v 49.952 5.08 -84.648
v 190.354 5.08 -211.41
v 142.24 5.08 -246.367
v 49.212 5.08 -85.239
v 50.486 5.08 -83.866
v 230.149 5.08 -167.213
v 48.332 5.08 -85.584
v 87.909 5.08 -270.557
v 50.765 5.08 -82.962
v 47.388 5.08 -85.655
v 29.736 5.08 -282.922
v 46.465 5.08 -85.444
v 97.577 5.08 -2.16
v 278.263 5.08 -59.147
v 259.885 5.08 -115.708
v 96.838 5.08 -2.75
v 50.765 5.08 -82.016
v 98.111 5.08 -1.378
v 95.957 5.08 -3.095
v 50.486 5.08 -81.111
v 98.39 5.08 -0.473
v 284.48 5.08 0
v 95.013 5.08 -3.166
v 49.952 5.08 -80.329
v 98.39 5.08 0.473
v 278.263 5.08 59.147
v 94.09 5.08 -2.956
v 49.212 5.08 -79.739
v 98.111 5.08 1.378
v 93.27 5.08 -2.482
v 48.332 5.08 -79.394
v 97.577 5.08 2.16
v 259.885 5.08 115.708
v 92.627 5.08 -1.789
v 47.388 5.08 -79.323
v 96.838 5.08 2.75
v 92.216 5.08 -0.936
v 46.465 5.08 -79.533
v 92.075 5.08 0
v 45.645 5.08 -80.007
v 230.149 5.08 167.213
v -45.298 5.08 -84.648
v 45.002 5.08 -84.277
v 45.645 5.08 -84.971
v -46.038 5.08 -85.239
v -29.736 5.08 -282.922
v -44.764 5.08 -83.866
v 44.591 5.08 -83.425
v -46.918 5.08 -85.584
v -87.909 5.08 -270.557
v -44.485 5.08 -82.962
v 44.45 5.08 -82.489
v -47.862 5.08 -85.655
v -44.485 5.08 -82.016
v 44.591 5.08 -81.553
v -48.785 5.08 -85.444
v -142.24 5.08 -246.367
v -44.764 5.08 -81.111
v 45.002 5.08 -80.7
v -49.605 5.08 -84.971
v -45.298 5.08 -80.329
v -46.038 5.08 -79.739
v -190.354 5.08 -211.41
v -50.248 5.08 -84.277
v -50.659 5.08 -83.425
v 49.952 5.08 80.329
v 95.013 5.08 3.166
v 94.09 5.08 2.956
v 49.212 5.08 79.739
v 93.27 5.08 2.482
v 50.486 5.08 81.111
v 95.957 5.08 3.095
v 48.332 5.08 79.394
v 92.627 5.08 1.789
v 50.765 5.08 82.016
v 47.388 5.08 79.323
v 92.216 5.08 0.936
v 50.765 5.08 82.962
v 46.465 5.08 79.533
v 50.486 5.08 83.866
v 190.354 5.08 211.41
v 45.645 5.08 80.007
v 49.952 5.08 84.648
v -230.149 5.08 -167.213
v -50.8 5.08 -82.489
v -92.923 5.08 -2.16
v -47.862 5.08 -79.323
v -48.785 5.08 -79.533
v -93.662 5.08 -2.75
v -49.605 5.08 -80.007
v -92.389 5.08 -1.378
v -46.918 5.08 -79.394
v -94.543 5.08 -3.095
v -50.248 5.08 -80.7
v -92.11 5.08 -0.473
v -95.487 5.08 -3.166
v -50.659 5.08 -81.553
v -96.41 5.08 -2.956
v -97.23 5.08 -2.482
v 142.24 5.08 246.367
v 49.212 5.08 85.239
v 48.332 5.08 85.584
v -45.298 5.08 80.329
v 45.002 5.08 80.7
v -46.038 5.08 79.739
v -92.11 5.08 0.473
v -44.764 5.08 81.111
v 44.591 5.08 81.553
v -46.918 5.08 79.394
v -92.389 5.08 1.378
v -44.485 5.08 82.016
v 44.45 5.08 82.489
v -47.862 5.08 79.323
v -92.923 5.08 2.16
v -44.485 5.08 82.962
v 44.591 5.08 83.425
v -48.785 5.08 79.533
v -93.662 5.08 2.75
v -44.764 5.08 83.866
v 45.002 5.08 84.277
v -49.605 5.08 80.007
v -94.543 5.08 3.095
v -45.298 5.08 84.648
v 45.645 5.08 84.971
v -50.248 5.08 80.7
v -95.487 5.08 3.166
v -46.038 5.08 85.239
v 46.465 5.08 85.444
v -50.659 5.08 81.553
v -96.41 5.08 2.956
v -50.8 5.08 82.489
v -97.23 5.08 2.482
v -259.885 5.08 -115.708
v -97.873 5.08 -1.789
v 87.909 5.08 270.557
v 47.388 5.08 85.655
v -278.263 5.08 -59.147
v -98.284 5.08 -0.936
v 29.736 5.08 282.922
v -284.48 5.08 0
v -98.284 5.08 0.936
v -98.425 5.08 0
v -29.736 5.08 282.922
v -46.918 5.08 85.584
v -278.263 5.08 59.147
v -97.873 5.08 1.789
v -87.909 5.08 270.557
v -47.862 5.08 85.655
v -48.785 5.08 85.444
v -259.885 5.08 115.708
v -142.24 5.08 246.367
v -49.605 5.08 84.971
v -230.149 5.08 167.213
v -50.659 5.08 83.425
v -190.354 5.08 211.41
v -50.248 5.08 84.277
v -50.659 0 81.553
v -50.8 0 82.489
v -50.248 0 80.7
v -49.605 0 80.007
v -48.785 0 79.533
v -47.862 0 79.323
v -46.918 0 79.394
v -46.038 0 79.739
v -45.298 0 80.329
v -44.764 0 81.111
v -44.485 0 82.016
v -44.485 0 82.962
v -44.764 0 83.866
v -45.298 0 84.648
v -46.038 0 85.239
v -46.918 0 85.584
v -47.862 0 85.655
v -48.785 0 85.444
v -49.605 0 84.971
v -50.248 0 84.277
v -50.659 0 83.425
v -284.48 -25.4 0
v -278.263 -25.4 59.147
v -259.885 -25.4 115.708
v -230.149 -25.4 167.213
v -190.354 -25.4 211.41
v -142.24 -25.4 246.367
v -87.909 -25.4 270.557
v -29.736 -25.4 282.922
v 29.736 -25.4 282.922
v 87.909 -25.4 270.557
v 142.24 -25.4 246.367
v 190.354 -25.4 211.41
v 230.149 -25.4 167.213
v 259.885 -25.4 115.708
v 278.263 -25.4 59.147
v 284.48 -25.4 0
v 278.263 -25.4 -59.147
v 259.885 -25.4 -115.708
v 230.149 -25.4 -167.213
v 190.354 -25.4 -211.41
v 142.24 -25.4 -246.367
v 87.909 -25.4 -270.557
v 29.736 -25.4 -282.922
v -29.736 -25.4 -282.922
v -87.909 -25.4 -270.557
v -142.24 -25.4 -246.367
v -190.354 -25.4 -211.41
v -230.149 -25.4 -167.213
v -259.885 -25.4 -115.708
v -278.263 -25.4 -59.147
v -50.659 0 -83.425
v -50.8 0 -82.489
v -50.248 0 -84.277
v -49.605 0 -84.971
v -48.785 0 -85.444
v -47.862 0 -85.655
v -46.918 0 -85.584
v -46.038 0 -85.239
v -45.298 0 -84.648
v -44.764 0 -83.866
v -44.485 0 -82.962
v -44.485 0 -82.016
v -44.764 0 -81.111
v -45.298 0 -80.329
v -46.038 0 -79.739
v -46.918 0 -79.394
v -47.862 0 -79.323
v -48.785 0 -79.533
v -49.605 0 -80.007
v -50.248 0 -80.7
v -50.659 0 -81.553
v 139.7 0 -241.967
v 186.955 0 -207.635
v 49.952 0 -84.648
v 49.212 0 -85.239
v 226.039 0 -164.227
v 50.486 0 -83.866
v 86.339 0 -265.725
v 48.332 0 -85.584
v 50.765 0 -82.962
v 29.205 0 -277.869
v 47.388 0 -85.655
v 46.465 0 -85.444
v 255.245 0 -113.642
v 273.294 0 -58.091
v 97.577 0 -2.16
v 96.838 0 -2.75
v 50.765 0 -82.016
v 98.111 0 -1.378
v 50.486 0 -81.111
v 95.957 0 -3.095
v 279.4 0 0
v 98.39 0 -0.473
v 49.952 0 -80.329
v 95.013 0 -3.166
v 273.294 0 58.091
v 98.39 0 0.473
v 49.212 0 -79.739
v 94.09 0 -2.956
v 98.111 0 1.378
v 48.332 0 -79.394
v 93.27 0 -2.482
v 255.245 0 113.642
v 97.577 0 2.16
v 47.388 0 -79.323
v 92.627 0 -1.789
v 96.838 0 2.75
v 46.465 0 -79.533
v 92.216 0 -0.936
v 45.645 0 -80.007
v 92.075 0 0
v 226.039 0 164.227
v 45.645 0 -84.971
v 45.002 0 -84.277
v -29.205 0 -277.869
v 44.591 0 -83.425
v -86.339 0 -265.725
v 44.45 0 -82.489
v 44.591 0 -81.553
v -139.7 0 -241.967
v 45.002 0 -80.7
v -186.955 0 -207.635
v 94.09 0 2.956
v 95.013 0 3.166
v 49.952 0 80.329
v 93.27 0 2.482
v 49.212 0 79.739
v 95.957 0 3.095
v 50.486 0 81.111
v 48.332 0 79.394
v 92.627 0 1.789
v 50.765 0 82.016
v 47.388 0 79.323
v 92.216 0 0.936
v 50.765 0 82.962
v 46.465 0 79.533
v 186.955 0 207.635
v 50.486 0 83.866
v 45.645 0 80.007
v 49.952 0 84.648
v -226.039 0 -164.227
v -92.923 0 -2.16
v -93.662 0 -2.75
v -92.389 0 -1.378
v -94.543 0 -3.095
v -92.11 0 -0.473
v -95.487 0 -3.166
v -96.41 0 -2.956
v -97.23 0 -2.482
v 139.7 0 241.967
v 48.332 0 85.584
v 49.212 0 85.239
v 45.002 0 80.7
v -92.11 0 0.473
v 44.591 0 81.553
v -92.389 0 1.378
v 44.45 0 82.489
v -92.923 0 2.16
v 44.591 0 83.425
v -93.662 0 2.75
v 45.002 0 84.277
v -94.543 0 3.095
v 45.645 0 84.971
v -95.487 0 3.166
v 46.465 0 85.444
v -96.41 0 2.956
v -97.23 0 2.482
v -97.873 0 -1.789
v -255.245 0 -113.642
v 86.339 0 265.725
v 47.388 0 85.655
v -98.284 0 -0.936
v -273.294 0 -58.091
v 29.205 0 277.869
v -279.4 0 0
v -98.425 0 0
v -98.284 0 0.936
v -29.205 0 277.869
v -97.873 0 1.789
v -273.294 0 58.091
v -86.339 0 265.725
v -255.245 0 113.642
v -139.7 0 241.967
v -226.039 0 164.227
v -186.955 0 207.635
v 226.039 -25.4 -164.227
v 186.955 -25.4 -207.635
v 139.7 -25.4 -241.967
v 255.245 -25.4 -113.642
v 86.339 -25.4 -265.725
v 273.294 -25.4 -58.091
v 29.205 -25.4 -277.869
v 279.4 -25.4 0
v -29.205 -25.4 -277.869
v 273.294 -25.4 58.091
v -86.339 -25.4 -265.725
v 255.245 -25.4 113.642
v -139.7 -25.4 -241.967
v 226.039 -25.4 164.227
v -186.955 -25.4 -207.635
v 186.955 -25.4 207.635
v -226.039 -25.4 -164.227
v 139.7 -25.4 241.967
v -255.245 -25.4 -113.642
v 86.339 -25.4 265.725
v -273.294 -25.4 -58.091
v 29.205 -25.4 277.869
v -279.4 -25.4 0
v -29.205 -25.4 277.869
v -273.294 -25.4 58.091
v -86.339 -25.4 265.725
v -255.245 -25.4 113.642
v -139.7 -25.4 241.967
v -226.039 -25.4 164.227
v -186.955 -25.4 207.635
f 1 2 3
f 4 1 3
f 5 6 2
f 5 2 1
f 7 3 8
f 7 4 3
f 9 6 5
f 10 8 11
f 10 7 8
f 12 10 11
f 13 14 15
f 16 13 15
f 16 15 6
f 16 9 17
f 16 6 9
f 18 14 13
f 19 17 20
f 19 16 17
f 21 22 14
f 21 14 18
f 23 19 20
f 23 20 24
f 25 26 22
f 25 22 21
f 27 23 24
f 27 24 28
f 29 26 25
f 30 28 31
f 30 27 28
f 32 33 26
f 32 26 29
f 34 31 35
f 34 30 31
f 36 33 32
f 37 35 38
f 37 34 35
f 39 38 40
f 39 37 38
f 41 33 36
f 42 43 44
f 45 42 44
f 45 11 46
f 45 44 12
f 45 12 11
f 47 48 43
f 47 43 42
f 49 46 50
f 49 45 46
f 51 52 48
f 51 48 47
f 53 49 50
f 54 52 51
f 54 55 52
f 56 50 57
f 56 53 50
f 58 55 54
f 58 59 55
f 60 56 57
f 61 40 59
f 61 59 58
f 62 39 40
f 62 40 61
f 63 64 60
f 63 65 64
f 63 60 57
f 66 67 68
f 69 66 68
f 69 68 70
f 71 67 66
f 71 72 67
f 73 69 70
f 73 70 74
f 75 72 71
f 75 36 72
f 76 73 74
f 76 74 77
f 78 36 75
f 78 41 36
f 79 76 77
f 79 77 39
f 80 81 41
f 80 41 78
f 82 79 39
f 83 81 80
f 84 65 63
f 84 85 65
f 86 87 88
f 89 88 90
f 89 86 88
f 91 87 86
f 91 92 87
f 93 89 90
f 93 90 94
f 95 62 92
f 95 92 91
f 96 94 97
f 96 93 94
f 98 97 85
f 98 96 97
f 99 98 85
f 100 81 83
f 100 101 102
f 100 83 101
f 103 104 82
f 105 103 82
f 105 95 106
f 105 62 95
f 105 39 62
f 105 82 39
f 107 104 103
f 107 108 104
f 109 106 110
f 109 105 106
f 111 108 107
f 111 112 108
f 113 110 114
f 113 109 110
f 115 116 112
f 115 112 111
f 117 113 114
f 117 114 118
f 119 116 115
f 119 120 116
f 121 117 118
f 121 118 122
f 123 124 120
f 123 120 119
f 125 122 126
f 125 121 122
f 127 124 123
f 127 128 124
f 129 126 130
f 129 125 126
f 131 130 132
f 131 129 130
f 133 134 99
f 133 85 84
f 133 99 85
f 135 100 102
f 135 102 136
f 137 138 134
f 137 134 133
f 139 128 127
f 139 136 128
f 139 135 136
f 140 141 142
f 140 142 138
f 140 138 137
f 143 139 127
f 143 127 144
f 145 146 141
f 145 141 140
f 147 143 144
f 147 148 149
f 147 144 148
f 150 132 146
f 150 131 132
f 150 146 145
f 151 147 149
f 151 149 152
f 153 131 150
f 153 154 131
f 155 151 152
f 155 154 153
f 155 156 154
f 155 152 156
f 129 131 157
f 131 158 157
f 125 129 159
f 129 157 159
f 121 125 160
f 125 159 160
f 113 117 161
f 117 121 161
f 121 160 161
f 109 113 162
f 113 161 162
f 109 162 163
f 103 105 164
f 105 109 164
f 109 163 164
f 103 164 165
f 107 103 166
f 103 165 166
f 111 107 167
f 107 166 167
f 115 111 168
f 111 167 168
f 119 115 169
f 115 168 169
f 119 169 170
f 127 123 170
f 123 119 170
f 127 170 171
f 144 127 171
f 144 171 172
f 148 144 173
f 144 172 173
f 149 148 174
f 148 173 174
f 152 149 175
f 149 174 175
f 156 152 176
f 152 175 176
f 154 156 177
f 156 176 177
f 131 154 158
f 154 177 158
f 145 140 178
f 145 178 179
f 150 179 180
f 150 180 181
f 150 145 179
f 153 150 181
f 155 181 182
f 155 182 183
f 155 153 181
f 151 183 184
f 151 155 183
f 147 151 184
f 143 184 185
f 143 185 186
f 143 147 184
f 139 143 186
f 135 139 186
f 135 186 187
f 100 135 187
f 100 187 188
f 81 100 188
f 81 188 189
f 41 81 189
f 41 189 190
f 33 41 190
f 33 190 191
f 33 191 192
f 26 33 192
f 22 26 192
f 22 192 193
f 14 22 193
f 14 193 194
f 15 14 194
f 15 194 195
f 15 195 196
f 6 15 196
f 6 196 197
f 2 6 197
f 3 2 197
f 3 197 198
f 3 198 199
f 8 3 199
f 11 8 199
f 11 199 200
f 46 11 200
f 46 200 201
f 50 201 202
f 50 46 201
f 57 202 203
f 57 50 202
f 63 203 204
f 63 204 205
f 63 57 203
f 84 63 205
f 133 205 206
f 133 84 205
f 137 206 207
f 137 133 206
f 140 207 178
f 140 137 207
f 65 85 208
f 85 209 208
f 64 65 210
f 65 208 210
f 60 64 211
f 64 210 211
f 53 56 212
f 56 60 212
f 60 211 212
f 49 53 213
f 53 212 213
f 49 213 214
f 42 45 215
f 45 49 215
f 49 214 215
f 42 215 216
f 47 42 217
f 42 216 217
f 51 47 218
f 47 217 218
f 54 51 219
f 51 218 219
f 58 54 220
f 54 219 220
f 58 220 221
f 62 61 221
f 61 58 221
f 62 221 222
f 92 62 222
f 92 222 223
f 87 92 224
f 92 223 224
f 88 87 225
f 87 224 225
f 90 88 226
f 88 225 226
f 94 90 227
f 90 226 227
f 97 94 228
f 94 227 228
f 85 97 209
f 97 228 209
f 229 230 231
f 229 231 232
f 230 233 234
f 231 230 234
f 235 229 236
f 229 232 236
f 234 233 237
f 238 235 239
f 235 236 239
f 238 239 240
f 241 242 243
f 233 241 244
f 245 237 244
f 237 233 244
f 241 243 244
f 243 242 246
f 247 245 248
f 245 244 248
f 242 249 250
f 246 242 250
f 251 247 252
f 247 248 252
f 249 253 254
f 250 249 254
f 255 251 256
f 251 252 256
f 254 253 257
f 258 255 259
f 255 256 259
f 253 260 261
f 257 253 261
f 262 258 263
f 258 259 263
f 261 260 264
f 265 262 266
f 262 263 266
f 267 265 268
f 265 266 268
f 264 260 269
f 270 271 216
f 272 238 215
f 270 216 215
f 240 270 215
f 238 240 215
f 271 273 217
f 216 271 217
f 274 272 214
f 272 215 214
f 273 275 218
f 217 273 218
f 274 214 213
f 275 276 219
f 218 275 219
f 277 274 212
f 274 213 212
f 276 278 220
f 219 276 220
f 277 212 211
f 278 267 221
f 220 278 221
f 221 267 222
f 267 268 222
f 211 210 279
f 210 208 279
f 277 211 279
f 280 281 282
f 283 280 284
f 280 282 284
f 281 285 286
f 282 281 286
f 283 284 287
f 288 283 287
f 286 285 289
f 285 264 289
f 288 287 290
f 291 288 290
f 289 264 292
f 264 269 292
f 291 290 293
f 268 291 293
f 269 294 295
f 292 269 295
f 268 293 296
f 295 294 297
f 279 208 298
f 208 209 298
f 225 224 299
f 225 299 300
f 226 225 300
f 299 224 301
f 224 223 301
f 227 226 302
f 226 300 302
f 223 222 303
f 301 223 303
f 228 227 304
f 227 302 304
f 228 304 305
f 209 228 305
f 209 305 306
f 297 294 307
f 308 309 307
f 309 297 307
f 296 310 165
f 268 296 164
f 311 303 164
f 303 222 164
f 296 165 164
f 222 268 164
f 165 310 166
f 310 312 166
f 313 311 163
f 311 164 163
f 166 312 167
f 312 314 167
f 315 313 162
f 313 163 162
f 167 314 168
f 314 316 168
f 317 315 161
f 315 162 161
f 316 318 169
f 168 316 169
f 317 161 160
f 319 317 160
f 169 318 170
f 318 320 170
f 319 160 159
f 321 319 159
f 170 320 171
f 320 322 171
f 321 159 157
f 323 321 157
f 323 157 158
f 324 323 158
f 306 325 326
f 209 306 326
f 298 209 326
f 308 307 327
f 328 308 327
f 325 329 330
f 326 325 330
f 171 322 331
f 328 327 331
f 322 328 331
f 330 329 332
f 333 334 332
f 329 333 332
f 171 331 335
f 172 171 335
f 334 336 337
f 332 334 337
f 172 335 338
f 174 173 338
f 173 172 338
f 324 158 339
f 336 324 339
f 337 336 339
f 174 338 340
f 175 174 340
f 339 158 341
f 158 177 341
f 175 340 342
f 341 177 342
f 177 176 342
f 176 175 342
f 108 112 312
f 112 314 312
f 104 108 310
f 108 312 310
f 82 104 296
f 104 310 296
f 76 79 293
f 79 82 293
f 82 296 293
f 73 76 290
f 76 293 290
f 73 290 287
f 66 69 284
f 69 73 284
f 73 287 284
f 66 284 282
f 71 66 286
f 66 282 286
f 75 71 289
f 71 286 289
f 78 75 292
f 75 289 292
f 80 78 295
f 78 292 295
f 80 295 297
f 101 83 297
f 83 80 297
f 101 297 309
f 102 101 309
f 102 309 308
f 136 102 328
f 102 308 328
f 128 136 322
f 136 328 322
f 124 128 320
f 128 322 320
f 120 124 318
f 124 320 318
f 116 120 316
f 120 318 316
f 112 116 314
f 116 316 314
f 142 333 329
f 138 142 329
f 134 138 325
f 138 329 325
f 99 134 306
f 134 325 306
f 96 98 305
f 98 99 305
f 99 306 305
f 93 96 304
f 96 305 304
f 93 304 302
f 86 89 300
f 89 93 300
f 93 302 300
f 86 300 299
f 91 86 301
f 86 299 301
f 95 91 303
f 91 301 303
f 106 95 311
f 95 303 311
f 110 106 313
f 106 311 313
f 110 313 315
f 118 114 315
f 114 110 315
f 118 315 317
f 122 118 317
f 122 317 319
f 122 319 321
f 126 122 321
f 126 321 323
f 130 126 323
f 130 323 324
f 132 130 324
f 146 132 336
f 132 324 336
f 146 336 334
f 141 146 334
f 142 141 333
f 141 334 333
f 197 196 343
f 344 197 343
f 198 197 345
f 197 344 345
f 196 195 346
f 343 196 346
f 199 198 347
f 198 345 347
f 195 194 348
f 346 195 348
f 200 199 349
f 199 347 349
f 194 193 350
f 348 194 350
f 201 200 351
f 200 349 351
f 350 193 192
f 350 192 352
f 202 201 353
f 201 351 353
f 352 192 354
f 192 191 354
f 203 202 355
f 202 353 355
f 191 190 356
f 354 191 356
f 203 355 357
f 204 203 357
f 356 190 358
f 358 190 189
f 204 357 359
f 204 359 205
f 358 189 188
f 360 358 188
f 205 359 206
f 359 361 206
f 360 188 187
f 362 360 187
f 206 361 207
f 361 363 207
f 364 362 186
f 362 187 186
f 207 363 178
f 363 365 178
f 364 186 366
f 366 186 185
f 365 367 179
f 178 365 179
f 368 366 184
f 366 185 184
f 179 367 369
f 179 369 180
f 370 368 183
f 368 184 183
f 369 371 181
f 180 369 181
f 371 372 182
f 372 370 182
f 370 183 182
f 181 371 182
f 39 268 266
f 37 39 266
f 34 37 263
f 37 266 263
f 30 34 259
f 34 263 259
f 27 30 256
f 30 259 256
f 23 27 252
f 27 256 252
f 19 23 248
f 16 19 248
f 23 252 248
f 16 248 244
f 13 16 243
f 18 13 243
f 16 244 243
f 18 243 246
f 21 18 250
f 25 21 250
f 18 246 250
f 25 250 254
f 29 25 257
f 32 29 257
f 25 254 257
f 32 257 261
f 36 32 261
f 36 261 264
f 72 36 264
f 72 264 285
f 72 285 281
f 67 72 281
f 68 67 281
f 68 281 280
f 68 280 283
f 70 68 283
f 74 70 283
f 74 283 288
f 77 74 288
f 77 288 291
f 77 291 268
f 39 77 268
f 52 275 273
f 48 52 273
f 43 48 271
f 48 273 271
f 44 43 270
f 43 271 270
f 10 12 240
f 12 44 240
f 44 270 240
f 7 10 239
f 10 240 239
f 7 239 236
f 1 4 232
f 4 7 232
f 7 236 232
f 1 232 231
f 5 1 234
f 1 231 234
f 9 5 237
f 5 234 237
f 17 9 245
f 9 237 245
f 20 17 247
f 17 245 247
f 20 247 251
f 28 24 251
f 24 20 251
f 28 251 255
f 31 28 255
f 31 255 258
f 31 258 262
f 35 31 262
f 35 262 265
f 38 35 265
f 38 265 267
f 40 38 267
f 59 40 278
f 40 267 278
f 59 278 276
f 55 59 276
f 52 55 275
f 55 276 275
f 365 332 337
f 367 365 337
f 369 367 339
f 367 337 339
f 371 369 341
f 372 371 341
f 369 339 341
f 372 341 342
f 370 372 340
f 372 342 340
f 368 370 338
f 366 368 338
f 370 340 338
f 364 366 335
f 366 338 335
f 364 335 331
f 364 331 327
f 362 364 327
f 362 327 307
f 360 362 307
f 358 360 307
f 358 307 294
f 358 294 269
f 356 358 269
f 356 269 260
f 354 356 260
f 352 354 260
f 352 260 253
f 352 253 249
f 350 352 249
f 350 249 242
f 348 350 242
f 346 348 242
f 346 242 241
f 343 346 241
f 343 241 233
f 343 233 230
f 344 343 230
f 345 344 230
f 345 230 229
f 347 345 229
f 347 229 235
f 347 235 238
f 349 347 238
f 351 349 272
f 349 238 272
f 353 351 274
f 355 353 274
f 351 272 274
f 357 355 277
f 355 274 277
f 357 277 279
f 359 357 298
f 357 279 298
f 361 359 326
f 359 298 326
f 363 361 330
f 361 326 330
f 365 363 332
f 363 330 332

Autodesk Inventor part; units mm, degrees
ref_plane "YZ Plane" through (0, 0, 0) normal (1, 0, 0) x (0, 1, 0)
ref_plane "XZ Plane" through (0, 0, 0) normal (0, 1, 0) x (-1, 0, 0)
ref_plane "XY Plane" through (0, 0, 0) normal (0, 0, 1) x (1, 0, 0)
sketch "Sketch1" plane through (0, 0, 0) normal (0, 1, 0) x (-1, 0, 0)
  circle A0 centre (0, 0) radius 254
  circle A1 centre (0, 0) radius 279.4
  line L0 (0, 279.4) -> (0, -279.4)
  line L1 (-279.4, 0) -> (279.4, 0)
  line L2 (197.5656, -197.5656) -> (-197.5656, 197.5656)
  line L3 (197.5656, 197.5656) -> (-197.5656, -197.5656)
  line L4 (206.5459, -188.5854) -> (-188.5854, 206.5459)
  line L5 (188.5854, -206.5459) -> (-206.5459, 188.5854)
  line L6 (188.5854, 206.5459) -> (-206.5459, -188.5854)
  line L7 (206.5459, 188.5854) -> (-188.5854, -206.5459)
  circle A2 centre (0, 0) radius 152.4
  circle A3 centre (0, 0) radius 101.6
  circle A4 centre (0, 0) radius 88.9
  circle A5 centre (0, 0) radius 139.7
  circle A6 centre (146.05, 0) radius 3.175
  circle A7 centre (73.025, 126.483) radius 3.175
  circle A8 centre (-73.025, 126.483) radius 3.175
  circle A9 centre (-146.05, 0) radius 3.175
  circle A10 centre (-73.025, -126.483) radius 3.175
  circle A11 centre (73.025, -126.483) radius 3.175
  circle A12 centre (95.25, 0) radius 3.175
  circle A13 centre (47.625, 82.4889) radius 3.175
  circle A14 centre (-47.625, 82.4889) radius 3.175
  circle A15 centre (-95.25, 0) radius 3.175
  circle A16 centre (-47.625, -82.4889) radius 3.175
  circle A17 centre (47.625, -82.4889) radius 3.175
  circle A18 centre (0, 0) radius 284.48
  dimension "d0" = 508
  dimension "d1" = 25.4
  dimension "d2" = 45
  dimension "d3" = 0
  dimension "d4" = 0
  dimension "d5" = 45
  dimension "d6" = 12.7
  dimension "d7" = 12.7
  dimension "d8" = 12.7
  dimension "d9" = 12.7
  dimension "d10" = 304.8
  dimension "d11" = 203.2
  dimension "d12" = 177.8
  dimension "d13" = 12.7
  dimension "d14" = 6.35
  dimension "d15" = 146.05
  dimension "d18" = 360
  dimension "d20" = 6.35
  dimension "d21" = 95.25
  dimension "d24" = 360
  dimension "d26" = 5.08
extrude "Extrusion1" add sketch "Sketch1" along normal blind 5.08 contours L1 A2 L7 A0 | L1 A1 L4 A0 | A0 L4 A2 L1 | A0 L7 A1 L1 | L7 A2 L3 A0 | A0 L3 A1 L7 | L4 A1 L2 A0 | A0 L2 A2 L4 | A2 L4 A5 L1 A6 | L1 A6 A5 L7 A2 | L3 A2 L6 A0 | A0 L6 A1 L3 | L7 A5 L3 A2 | L2 A1 L5 A0 | A0 L5 A2 L2 | A2 L2 A5 L4 | A6 L1 | L1 A6 | L6 A2 L0 A0 | A0 L0 A1 L6 | L3 A5 L6 A2 | A5 L1 A3 L7 | L7 A3 L3 A5 | L5 A1 L0 A0 | A0 L0 A2 L5 | A2 L5 A5 L2 | A5 L2 A3 L4 | L4 A3 L1 A5 | L0 A2 L4 A0 | A0 L4 A1 L0 | L6 A5 L0 A2 | L3 A3 L6 A5 | A3 L1 A12 A4 L7 | L7 A4 L3 A3 | L0 A1 L7 A0 | A0 L7 A2 L0 | A2 L0 A5 L5 | A5 L5 A3 L2 | A3 L2 A4 L4 | L4 A4 L1 A12 A3 | L4 A2 L2 A0 | A0 L2 A1 L4 | L0 A5 L4 A2 | L6 A3 L0 A5 | L3 A4 L6 A3 | A4 L1 L7 | L7 L4 L3 A4 | L7 A1 L3 A0 | A0 L3 A2 L7 | A2 L7 A5 L0 | A5 L0 A3 L5 | A3 L5 A4 L2 | A4 L2 L7 L4 | L4 L1 A4 | L2 A2 L5 A0 | A0 L5 A1 L2 | L4 A5 L2 A2 | L0 A3 L4 A5 | L6 A4 L0 A3 | L3 L4 L6 A4 | L7 L2 L1 | L1 L3 L4 | L3 A1 L6 A0 | A0 L6 A2 L3 | A2 L3 A5 L7 | A5 L7 A3 L0 | A3 L0 A4 L5 | A4 L5 L7 L2 | L5 A2 L1 A0 | A0 L1 A1 L5 | L2 A5 L5 A2 | L4 A3 L2 A5 | L0 A4 L4 A3 | L6 L0 A4 | L3 L0 L4 | L2 L6 L0 | L2 L7 L0 | L3 L5 L1 | L1 L6 L2 | L0 L5 L3 | L6 A1 L1 A0 | A0 L1 A2 L6 | A2 L6 A5 L3 | A5 L3 A3 L7 | A3 L7 A4 L0 | A4 L0 L5 | L5 A5 L1 A9 A2 | L2 A3 L5 A5 | L4 A4 L2 A3 | L0 L4 A4 | L6 L2 A4 L4 | L7 A4 L3 L5 | L0 A4 L7 | L6 A4 L1 | L1 A4 L5 | L5 A4 L2 L6 | L5 L3 A4 L6 | A2 L1 A9 A5 L6 | A5 L6 A3 L3 | A3 L3 A4 L7 | L5 A3 L1 A5 | L2 A4 L5 A3 | A4 L6 A3 L1 A15 | L1 A15 A3 L5 A4 | A4 L3 A3 L6 | A5 L1 A3 L6 | A9 L1 | L1 A9 | A7 | A8 | A10 | A11 | A18
extrude "Extrusion2" add sketch "Sketch1" against normal blind 25.4 contours A18
properties part number "Lazy suzan Top piece"
